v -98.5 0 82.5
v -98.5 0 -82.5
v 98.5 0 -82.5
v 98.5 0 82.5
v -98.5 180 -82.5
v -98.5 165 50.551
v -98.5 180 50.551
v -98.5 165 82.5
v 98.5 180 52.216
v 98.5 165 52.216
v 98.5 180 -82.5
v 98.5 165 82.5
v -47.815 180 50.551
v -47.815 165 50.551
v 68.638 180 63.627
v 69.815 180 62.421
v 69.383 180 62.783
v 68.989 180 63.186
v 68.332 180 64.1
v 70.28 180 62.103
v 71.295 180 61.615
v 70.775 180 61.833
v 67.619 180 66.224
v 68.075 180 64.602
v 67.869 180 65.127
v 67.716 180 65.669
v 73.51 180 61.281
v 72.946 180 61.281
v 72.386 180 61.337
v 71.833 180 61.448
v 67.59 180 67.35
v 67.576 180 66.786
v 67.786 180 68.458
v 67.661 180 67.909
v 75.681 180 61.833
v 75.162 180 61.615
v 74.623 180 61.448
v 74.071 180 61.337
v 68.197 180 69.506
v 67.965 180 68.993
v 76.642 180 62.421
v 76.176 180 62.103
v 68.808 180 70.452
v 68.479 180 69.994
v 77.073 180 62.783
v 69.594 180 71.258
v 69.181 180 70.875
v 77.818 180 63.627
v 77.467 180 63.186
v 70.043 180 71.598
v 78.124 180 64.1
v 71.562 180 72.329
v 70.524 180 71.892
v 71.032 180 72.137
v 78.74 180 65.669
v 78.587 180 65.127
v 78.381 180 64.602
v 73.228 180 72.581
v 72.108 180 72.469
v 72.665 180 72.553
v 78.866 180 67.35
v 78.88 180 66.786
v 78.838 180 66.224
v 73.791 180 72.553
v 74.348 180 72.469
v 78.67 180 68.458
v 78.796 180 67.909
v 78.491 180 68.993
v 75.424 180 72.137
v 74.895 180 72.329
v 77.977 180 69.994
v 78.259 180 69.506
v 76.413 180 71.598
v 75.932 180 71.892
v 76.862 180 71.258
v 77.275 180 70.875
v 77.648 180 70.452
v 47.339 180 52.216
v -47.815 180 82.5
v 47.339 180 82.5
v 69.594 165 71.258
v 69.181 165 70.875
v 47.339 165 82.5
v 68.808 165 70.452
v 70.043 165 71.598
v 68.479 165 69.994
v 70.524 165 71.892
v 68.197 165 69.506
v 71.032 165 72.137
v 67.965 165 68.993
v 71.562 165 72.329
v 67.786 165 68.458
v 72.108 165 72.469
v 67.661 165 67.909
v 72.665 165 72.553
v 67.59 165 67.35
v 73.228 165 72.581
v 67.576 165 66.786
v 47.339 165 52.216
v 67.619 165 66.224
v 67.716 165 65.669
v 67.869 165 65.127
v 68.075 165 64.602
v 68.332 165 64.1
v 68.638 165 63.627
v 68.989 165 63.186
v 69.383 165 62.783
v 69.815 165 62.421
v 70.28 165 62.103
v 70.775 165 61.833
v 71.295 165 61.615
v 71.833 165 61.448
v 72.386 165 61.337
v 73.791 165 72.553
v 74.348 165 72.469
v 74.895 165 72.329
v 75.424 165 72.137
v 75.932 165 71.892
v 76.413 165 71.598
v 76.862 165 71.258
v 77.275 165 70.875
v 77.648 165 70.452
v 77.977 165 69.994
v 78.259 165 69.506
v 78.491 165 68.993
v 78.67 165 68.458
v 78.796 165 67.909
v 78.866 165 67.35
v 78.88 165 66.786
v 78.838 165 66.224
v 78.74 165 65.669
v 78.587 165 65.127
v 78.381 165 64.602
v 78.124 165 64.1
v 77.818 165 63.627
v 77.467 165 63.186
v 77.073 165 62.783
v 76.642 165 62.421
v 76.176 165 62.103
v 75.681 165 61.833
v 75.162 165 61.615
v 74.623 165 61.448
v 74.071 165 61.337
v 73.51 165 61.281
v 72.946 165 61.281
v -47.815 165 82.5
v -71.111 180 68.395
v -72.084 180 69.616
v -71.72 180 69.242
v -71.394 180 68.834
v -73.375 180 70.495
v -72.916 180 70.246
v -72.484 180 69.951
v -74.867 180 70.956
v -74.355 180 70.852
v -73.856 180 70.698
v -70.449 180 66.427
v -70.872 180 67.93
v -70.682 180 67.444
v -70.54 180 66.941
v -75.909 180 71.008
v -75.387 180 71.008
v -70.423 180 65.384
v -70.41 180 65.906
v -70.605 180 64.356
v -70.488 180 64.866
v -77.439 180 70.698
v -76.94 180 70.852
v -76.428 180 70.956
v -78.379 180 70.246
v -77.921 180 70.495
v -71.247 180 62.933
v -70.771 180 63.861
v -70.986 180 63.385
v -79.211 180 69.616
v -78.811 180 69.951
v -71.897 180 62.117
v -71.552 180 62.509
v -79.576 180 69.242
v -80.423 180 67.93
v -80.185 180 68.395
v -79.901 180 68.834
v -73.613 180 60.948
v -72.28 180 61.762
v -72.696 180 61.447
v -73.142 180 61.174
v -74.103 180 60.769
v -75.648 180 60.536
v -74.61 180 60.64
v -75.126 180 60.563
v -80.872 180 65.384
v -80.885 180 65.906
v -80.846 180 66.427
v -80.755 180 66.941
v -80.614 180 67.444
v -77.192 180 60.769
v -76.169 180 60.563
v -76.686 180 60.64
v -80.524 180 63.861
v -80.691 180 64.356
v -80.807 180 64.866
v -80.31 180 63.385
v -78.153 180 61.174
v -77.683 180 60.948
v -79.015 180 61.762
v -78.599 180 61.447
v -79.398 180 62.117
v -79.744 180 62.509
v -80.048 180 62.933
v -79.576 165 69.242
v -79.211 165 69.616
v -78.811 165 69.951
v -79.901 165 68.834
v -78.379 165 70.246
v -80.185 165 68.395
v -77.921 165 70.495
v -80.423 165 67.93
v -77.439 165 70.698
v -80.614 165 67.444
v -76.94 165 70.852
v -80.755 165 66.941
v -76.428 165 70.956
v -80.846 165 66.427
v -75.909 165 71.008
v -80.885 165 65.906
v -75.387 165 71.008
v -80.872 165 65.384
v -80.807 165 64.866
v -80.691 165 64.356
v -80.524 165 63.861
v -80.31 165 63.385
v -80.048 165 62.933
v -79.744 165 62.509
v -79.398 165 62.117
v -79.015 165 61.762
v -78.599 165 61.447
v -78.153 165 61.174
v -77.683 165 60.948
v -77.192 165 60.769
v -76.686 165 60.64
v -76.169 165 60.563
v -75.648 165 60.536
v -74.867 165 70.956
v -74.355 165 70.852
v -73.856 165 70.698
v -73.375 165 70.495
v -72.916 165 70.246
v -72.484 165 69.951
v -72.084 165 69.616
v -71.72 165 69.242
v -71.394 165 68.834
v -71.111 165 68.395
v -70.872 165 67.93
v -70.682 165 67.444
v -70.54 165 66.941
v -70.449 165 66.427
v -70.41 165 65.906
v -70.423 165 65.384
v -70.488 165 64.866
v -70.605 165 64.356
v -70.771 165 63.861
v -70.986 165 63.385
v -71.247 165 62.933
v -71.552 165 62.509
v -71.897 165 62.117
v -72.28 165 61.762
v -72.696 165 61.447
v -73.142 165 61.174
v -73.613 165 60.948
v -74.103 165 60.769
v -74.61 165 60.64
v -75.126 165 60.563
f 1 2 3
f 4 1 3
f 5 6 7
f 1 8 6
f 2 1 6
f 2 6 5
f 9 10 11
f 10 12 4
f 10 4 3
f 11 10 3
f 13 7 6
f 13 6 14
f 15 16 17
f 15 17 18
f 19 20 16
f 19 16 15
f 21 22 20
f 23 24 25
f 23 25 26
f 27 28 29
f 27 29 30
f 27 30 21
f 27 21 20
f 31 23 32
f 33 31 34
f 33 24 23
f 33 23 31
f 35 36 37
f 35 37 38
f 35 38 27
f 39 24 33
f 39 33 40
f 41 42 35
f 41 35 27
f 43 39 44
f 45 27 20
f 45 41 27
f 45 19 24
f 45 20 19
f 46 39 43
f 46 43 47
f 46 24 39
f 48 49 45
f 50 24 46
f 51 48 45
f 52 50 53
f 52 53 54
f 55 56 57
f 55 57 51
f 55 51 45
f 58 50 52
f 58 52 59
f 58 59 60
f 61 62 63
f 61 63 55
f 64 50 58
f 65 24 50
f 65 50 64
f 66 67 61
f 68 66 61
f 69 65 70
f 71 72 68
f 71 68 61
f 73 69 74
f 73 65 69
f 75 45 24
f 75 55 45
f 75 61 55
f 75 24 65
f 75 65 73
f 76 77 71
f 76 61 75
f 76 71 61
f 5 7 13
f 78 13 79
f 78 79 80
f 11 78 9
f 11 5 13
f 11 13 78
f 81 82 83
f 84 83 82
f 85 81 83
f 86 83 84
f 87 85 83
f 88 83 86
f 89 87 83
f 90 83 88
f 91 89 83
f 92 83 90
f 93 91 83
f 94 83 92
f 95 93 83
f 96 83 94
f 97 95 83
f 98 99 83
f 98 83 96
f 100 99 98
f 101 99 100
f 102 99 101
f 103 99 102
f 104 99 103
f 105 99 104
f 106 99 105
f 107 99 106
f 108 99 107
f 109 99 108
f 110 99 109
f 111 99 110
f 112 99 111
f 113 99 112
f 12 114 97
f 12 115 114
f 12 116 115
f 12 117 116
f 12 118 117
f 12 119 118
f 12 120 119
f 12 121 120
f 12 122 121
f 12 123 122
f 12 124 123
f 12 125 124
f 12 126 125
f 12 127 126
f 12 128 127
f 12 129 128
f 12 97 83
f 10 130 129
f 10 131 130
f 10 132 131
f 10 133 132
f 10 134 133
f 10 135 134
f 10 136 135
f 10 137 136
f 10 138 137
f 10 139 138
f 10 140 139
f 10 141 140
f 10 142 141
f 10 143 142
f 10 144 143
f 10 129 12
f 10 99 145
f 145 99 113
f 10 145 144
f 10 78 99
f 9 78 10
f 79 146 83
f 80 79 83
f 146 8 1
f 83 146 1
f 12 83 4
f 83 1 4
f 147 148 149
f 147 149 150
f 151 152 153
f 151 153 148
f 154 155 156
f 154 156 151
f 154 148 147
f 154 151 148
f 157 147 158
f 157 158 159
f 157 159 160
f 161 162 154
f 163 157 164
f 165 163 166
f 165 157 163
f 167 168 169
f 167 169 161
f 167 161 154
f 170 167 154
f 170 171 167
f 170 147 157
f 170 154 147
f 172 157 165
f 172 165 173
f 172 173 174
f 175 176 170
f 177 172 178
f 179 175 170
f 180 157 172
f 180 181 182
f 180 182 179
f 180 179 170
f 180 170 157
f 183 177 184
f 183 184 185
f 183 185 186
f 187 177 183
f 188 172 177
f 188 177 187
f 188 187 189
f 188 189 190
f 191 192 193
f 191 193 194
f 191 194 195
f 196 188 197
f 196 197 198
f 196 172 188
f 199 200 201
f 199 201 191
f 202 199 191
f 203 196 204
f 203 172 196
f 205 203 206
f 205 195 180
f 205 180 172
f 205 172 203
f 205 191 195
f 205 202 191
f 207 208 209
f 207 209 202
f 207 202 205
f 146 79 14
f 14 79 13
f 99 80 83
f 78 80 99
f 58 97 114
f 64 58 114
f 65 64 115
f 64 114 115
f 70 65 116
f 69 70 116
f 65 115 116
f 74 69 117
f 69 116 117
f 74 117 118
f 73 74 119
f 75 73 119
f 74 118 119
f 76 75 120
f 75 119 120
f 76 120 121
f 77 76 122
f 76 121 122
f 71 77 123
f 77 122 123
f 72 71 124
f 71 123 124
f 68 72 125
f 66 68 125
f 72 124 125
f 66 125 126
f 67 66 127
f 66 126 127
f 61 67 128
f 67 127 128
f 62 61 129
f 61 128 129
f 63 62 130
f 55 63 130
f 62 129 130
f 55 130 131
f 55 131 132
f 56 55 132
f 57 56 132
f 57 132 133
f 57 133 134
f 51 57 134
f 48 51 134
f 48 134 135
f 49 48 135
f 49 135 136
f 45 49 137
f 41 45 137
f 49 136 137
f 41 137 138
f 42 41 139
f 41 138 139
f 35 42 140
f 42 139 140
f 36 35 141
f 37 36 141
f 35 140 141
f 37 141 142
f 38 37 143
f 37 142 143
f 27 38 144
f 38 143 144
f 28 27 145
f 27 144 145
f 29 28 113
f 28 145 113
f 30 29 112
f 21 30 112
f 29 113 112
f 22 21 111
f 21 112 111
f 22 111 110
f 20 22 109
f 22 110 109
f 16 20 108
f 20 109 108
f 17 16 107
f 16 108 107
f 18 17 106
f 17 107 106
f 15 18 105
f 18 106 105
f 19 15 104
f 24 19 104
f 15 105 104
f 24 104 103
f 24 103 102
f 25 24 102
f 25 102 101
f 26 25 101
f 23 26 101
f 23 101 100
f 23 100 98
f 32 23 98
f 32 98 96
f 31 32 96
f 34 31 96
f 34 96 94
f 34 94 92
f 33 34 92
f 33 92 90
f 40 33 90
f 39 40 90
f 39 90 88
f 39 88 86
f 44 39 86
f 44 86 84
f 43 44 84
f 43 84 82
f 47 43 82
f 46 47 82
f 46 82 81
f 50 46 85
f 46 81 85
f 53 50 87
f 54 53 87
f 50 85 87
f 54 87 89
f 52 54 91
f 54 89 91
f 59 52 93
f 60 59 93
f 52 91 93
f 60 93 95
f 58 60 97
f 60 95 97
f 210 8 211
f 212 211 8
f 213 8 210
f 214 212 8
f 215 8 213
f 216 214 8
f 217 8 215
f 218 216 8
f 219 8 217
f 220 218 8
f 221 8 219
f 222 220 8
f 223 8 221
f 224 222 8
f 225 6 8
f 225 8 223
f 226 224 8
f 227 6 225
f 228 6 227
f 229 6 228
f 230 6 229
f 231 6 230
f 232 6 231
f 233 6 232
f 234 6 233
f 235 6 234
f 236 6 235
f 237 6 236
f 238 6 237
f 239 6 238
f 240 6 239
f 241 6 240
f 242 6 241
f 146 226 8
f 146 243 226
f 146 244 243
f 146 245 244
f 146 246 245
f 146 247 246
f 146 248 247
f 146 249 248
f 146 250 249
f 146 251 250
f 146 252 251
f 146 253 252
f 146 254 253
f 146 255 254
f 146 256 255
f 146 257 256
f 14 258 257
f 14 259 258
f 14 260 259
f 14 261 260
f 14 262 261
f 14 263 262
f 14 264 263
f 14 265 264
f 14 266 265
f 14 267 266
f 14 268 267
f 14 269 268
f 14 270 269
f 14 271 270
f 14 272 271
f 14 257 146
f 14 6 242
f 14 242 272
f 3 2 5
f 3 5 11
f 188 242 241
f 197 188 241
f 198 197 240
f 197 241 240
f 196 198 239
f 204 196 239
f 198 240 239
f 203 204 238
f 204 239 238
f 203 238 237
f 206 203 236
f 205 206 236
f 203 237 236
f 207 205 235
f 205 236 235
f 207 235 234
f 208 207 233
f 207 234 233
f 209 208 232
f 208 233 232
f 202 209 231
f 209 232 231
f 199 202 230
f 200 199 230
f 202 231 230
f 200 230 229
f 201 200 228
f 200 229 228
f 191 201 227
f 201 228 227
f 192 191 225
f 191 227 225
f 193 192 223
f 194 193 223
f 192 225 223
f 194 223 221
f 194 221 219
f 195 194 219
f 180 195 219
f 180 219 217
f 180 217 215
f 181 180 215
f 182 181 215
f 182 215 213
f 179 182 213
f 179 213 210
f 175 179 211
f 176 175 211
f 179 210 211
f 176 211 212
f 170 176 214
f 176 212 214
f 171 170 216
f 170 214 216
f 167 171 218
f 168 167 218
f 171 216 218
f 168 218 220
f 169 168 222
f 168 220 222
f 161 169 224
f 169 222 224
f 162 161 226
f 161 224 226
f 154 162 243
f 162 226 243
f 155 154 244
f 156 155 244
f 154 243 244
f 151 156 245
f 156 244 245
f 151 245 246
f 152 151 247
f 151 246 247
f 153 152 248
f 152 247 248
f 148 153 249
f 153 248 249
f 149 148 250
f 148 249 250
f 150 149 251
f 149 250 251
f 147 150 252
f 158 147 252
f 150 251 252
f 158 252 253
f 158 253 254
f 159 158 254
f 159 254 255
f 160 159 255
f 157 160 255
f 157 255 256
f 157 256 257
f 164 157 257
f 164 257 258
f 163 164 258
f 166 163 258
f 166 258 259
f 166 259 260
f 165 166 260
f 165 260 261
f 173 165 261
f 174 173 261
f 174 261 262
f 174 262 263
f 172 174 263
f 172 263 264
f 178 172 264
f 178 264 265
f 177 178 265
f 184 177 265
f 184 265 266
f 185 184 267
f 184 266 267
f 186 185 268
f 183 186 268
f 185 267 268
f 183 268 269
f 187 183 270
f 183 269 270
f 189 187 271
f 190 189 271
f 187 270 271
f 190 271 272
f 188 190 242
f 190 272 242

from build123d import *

# Parameters (mm, degrees)
SKETCH_2_W          = 197
SKETCH_2_H          = 165
EXTRUDE_1_DEPTH     = 180
SKETCH_3_W          = 50.684983536
SKETCH_3_H          = 31.949298514
CUT_EXTRUDE_2_DEPTH = 15
SKETCH_4_W          = 51.160754844
SKETCH_4_H          = 30.284098936
CUT_EXTRUDE_3_DEPTH = 15
SKETCH_5_R          = 5.238888092
EXTRUDE_2_DEPTH     = 15
SKETCH_6_R          = 5.653498574
EXTRUDE_3_DEPTH     = 15


with BuildPart() as part:
    # 草图2 → 凸台-拉伸1 (new body)
    with BuildSketch(Plane(origin=(0, 0, 0), x_dir=(1, 0, 0), z_dir=(0, 1, 0))):
        Rectangle(SKETCH_2_W, SKETCH_2_H)
    extrude(amount=EXTRUDE_1_DEPTH)

    # 草图3 → 切除-拉伸2 (cut)
    with BuildSketch(Plane(origin=(0, 180, 0), x_dir=(1, 0, 0), z_dir=(0, 1, 0))):
        with Locations((-73.157508232, -66.525350743)):
            Rectangle(SKETCH_3_W, SKETCH_3_H)
    extrude(amount=-CUT_EXTRUDE_2_DEPTH, mode=Mode.SUBTRACT)

    # 草图4 → 切除-拉伸3 (cut)
    with BuildSketch(Plane(origin=(0, 180, 0), x_dir=(1, 0, 0), z_dir=(0, 1, 0))):
        with Locations((72.919622578, -67.357950532)):
            Rectangle(SKETCH_4_W, SKETCH_4_H)
    extrude(amount=-CUT_EXTRUDE_3_DEPTH, mode=Mode.SUBTRACT)

    # 草图5 → 凸台-拉伸2 (add)
    with BuildSketch(Plane(origin=(0, 165, 0), x_dir=(1, 0, 0), z_dir=(0, 1, 0))):
        with Locations(Location((-75.647637988, -65.775383345, 0), (0, 0, 90))):
            Circle(SKETCH_5_R)
    extrude(amount=EXTRUDE_2_DEPTH)

    # 草图6 → 凸台-拉伸3 (add)
    with BuildSketch(Plane(origin=(0, 165, 0), x_dir=(1, 0, 0), z_dir=(0, 1, 0))):
        with Locations(Location((73.228131145, -66.927099699, 0), (0, 0, 270))):
            Circle(SKETCH_6_R)
    extrude(amount=EXTRUDE_3_DEPTH)


solid = part.part
